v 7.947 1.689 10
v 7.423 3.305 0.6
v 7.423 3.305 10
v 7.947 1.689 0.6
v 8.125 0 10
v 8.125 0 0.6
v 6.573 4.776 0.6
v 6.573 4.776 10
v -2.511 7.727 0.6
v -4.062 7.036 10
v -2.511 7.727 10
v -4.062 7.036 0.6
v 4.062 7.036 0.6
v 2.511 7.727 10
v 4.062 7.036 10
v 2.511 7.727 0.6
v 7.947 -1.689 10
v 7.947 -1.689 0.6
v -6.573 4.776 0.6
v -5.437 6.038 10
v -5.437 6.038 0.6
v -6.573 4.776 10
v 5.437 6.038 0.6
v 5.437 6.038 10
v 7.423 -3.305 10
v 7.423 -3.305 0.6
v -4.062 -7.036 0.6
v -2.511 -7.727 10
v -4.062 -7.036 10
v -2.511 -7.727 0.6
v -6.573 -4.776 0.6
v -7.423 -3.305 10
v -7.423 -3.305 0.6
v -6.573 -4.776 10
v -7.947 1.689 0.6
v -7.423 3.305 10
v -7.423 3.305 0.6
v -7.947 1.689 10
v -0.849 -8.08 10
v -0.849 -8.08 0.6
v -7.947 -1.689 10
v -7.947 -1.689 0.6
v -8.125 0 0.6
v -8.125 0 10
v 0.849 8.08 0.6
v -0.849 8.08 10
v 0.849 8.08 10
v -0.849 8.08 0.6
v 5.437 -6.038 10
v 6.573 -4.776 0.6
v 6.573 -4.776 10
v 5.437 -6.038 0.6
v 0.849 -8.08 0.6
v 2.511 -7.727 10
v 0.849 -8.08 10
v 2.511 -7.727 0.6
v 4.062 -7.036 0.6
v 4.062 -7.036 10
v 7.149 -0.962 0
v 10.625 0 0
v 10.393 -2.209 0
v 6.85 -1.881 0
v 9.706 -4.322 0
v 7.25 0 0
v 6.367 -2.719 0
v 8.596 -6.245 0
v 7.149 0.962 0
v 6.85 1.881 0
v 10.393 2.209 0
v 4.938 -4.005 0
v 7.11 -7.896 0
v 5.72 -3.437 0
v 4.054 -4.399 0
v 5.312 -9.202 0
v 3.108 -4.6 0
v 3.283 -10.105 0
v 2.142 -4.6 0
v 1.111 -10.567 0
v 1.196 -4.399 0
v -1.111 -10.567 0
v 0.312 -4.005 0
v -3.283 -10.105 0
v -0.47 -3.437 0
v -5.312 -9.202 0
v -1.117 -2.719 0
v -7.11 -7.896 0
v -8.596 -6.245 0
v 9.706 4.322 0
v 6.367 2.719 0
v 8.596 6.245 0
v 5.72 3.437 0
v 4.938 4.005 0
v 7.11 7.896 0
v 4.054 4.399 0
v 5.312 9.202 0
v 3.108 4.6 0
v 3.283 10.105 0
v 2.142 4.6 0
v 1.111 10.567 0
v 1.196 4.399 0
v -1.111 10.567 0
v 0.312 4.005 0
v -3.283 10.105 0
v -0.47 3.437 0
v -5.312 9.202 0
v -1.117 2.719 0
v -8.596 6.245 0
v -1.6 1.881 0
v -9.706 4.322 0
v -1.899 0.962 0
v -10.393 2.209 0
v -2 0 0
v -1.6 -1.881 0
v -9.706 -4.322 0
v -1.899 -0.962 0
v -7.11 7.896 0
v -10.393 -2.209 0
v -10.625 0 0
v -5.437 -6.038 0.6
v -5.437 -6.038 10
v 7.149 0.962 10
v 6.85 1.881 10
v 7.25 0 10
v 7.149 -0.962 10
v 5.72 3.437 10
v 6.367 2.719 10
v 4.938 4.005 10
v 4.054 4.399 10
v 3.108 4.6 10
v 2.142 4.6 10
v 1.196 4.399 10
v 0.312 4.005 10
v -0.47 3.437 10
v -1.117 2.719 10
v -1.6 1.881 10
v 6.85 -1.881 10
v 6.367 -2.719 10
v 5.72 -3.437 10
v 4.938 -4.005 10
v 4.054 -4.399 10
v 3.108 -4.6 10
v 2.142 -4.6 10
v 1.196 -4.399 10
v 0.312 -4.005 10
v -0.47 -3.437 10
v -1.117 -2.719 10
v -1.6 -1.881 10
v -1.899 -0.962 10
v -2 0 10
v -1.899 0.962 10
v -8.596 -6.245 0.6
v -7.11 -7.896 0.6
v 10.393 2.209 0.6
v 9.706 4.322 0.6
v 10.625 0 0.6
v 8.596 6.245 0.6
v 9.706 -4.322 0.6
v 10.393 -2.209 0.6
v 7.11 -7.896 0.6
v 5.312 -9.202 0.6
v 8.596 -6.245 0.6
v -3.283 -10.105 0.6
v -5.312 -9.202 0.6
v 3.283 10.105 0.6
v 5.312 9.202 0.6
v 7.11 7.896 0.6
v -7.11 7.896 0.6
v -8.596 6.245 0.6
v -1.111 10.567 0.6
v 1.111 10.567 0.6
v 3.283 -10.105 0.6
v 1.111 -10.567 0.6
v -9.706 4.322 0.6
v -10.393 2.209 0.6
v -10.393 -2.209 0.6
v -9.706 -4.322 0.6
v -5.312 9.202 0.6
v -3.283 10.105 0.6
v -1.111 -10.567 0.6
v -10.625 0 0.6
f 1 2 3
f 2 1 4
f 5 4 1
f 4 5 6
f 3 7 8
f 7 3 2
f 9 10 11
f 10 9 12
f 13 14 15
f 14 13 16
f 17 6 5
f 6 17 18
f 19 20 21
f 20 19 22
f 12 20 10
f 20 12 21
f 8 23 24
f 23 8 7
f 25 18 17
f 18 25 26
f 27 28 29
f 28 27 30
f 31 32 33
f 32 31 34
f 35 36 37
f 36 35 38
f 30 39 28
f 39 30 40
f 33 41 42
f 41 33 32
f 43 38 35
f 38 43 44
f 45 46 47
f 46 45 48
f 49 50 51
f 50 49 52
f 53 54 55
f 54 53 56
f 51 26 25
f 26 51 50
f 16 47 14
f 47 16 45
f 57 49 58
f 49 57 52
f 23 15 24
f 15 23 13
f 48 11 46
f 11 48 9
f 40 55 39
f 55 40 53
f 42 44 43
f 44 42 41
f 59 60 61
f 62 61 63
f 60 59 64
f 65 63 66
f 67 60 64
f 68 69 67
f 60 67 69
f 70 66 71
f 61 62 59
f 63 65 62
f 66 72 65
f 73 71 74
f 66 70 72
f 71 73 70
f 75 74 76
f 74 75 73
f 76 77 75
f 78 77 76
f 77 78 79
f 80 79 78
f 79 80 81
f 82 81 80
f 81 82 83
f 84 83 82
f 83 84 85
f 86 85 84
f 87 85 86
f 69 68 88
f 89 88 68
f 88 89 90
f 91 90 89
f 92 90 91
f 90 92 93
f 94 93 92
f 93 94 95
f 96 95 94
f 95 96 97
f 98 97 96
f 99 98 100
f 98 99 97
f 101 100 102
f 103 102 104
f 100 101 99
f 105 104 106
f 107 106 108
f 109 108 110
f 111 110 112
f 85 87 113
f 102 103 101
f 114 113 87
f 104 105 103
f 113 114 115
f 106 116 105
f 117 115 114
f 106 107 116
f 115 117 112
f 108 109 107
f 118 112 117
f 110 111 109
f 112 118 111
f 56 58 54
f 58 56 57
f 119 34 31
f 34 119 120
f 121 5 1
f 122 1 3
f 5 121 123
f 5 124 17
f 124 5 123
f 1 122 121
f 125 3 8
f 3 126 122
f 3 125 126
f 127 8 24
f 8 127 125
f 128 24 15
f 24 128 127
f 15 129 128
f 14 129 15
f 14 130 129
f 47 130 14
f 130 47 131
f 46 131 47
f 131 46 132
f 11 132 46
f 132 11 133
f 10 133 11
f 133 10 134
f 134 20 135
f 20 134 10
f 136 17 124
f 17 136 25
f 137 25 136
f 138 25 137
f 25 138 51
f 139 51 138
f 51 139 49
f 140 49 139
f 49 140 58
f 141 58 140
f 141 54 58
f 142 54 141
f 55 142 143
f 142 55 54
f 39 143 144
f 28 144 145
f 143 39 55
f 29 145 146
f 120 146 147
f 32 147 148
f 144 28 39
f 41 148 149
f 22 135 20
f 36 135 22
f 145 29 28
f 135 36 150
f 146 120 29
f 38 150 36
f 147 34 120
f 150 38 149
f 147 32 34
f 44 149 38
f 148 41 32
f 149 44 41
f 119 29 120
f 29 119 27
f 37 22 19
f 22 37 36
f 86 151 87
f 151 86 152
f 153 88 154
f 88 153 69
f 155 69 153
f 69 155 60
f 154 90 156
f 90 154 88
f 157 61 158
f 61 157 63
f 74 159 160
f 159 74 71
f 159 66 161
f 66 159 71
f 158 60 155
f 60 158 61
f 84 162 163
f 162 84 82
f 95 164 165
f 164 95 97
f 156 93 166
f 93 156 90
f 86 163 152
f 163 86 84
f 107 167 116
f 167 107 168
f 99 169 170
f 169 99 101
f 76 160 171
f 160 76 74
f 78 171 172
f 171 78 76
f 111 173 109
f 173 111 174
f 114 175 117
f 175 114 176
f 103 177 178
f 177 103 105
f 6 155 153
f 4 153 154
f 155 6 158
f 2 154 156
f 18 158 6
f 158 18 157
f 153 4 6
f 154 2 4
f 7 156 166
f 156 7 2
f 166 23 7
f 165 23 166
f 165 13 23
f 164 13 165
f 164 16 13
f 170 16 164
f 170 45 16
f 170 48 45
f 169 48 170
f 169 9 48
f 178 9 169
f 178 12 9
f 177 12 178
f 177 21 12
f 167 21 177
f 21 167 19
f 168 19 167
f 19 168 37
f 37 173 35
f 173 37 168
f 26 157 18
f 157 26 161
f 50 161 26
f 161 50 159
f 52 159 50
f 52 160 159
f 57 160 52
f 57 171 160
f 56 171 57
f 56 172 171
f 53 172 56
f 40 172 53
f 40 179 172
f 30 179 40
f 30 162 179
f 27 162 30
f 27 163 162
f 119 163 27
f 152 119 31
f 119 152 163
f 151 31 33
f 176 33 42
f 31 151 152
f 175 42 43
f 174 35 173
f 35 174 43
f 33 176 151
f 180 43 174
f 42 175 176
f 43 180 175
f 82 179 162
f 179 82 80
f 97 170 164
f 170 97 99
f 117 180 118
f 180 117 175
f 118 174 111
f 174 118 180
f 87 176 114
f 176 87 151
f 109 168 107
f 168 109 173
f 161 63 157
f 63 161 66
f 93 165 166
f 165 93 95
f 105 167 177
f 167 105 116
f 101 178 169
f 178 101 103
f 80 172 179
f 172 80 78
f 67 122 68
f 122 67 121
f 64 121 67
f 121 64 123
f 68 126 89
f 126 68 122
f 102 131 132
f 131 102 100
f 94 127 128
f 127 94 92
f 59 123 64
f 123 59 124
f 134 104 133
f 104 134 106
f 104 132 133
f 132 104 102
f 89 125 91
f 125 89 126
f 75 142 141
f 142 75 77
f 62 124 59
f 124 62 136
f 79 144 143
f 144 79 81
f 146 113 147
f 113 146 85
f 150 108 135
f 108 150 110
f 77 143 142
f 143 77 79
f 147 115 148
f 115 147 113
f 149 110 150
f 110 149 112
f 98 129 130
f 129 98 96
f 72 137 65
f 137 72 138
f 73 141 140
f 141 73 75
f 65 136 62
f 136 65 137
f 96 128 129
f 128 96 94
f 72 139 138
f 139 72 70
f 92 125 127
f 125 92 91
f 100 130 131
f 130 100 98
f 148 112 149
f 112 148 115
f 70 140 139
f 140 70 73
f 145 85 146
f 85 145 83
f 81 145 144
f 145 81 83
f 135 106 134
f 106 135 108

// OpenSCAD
/*
Toilet seat wobble fixer
This bushing shims the bolt to the toilet so the seat won't wiggle so bad

Mike Creuzer - Mike@Creuzer.com - 2012-08-23
Update 2012-12-23 Added offset to allow for elliptical usage for seats that don't exactly align to the center of the stool's holes.
Update 2013-01-14 Tweaked parameter names for customizer

Measurements are dimensionless but assumed to be in mm for most programs.
*/

//Toilet measurement - maybe make this a bit short if your nut is convex
hole_depth = 10;
//Toilet measurement
hole_width = 16.25;

// Bolt measurement
bolt_width = 9.25;

// Part Measurement - Make this a couple of layers for your printer for good results.
brim_height = 0.6; 
// Part Measurement - Shoulder so the shim won't fall out of the hole.
brim_width = 5;
//Percentage to offset the center hole from center.
hole_offset = 75; //  [0:100]
offset = hole_offset * 0.01;
// (factor * by .02) 2 is the default for fast rendering, .01 is as good as it gets. 
curve_quality_percentage = 0.5; // [.5:100]
curve_quality = curve_quality_percentage * .02;

difference()
{
	union()
	{
		cylinder(r = hole_width / 2, h=hole_depth, $fs = curve_quality); // The shim
		cylinder(r = (hole_width + brim_width) / 2, h=brim_height); // the shoulder
	}
	translate(v = [offset * ((hole_width-bolt_width) / 2), 0, 0]) cylinder(r = bolt_width / 2, h=hole_depth, $fs = curve_quality); // The bolt hole
}
